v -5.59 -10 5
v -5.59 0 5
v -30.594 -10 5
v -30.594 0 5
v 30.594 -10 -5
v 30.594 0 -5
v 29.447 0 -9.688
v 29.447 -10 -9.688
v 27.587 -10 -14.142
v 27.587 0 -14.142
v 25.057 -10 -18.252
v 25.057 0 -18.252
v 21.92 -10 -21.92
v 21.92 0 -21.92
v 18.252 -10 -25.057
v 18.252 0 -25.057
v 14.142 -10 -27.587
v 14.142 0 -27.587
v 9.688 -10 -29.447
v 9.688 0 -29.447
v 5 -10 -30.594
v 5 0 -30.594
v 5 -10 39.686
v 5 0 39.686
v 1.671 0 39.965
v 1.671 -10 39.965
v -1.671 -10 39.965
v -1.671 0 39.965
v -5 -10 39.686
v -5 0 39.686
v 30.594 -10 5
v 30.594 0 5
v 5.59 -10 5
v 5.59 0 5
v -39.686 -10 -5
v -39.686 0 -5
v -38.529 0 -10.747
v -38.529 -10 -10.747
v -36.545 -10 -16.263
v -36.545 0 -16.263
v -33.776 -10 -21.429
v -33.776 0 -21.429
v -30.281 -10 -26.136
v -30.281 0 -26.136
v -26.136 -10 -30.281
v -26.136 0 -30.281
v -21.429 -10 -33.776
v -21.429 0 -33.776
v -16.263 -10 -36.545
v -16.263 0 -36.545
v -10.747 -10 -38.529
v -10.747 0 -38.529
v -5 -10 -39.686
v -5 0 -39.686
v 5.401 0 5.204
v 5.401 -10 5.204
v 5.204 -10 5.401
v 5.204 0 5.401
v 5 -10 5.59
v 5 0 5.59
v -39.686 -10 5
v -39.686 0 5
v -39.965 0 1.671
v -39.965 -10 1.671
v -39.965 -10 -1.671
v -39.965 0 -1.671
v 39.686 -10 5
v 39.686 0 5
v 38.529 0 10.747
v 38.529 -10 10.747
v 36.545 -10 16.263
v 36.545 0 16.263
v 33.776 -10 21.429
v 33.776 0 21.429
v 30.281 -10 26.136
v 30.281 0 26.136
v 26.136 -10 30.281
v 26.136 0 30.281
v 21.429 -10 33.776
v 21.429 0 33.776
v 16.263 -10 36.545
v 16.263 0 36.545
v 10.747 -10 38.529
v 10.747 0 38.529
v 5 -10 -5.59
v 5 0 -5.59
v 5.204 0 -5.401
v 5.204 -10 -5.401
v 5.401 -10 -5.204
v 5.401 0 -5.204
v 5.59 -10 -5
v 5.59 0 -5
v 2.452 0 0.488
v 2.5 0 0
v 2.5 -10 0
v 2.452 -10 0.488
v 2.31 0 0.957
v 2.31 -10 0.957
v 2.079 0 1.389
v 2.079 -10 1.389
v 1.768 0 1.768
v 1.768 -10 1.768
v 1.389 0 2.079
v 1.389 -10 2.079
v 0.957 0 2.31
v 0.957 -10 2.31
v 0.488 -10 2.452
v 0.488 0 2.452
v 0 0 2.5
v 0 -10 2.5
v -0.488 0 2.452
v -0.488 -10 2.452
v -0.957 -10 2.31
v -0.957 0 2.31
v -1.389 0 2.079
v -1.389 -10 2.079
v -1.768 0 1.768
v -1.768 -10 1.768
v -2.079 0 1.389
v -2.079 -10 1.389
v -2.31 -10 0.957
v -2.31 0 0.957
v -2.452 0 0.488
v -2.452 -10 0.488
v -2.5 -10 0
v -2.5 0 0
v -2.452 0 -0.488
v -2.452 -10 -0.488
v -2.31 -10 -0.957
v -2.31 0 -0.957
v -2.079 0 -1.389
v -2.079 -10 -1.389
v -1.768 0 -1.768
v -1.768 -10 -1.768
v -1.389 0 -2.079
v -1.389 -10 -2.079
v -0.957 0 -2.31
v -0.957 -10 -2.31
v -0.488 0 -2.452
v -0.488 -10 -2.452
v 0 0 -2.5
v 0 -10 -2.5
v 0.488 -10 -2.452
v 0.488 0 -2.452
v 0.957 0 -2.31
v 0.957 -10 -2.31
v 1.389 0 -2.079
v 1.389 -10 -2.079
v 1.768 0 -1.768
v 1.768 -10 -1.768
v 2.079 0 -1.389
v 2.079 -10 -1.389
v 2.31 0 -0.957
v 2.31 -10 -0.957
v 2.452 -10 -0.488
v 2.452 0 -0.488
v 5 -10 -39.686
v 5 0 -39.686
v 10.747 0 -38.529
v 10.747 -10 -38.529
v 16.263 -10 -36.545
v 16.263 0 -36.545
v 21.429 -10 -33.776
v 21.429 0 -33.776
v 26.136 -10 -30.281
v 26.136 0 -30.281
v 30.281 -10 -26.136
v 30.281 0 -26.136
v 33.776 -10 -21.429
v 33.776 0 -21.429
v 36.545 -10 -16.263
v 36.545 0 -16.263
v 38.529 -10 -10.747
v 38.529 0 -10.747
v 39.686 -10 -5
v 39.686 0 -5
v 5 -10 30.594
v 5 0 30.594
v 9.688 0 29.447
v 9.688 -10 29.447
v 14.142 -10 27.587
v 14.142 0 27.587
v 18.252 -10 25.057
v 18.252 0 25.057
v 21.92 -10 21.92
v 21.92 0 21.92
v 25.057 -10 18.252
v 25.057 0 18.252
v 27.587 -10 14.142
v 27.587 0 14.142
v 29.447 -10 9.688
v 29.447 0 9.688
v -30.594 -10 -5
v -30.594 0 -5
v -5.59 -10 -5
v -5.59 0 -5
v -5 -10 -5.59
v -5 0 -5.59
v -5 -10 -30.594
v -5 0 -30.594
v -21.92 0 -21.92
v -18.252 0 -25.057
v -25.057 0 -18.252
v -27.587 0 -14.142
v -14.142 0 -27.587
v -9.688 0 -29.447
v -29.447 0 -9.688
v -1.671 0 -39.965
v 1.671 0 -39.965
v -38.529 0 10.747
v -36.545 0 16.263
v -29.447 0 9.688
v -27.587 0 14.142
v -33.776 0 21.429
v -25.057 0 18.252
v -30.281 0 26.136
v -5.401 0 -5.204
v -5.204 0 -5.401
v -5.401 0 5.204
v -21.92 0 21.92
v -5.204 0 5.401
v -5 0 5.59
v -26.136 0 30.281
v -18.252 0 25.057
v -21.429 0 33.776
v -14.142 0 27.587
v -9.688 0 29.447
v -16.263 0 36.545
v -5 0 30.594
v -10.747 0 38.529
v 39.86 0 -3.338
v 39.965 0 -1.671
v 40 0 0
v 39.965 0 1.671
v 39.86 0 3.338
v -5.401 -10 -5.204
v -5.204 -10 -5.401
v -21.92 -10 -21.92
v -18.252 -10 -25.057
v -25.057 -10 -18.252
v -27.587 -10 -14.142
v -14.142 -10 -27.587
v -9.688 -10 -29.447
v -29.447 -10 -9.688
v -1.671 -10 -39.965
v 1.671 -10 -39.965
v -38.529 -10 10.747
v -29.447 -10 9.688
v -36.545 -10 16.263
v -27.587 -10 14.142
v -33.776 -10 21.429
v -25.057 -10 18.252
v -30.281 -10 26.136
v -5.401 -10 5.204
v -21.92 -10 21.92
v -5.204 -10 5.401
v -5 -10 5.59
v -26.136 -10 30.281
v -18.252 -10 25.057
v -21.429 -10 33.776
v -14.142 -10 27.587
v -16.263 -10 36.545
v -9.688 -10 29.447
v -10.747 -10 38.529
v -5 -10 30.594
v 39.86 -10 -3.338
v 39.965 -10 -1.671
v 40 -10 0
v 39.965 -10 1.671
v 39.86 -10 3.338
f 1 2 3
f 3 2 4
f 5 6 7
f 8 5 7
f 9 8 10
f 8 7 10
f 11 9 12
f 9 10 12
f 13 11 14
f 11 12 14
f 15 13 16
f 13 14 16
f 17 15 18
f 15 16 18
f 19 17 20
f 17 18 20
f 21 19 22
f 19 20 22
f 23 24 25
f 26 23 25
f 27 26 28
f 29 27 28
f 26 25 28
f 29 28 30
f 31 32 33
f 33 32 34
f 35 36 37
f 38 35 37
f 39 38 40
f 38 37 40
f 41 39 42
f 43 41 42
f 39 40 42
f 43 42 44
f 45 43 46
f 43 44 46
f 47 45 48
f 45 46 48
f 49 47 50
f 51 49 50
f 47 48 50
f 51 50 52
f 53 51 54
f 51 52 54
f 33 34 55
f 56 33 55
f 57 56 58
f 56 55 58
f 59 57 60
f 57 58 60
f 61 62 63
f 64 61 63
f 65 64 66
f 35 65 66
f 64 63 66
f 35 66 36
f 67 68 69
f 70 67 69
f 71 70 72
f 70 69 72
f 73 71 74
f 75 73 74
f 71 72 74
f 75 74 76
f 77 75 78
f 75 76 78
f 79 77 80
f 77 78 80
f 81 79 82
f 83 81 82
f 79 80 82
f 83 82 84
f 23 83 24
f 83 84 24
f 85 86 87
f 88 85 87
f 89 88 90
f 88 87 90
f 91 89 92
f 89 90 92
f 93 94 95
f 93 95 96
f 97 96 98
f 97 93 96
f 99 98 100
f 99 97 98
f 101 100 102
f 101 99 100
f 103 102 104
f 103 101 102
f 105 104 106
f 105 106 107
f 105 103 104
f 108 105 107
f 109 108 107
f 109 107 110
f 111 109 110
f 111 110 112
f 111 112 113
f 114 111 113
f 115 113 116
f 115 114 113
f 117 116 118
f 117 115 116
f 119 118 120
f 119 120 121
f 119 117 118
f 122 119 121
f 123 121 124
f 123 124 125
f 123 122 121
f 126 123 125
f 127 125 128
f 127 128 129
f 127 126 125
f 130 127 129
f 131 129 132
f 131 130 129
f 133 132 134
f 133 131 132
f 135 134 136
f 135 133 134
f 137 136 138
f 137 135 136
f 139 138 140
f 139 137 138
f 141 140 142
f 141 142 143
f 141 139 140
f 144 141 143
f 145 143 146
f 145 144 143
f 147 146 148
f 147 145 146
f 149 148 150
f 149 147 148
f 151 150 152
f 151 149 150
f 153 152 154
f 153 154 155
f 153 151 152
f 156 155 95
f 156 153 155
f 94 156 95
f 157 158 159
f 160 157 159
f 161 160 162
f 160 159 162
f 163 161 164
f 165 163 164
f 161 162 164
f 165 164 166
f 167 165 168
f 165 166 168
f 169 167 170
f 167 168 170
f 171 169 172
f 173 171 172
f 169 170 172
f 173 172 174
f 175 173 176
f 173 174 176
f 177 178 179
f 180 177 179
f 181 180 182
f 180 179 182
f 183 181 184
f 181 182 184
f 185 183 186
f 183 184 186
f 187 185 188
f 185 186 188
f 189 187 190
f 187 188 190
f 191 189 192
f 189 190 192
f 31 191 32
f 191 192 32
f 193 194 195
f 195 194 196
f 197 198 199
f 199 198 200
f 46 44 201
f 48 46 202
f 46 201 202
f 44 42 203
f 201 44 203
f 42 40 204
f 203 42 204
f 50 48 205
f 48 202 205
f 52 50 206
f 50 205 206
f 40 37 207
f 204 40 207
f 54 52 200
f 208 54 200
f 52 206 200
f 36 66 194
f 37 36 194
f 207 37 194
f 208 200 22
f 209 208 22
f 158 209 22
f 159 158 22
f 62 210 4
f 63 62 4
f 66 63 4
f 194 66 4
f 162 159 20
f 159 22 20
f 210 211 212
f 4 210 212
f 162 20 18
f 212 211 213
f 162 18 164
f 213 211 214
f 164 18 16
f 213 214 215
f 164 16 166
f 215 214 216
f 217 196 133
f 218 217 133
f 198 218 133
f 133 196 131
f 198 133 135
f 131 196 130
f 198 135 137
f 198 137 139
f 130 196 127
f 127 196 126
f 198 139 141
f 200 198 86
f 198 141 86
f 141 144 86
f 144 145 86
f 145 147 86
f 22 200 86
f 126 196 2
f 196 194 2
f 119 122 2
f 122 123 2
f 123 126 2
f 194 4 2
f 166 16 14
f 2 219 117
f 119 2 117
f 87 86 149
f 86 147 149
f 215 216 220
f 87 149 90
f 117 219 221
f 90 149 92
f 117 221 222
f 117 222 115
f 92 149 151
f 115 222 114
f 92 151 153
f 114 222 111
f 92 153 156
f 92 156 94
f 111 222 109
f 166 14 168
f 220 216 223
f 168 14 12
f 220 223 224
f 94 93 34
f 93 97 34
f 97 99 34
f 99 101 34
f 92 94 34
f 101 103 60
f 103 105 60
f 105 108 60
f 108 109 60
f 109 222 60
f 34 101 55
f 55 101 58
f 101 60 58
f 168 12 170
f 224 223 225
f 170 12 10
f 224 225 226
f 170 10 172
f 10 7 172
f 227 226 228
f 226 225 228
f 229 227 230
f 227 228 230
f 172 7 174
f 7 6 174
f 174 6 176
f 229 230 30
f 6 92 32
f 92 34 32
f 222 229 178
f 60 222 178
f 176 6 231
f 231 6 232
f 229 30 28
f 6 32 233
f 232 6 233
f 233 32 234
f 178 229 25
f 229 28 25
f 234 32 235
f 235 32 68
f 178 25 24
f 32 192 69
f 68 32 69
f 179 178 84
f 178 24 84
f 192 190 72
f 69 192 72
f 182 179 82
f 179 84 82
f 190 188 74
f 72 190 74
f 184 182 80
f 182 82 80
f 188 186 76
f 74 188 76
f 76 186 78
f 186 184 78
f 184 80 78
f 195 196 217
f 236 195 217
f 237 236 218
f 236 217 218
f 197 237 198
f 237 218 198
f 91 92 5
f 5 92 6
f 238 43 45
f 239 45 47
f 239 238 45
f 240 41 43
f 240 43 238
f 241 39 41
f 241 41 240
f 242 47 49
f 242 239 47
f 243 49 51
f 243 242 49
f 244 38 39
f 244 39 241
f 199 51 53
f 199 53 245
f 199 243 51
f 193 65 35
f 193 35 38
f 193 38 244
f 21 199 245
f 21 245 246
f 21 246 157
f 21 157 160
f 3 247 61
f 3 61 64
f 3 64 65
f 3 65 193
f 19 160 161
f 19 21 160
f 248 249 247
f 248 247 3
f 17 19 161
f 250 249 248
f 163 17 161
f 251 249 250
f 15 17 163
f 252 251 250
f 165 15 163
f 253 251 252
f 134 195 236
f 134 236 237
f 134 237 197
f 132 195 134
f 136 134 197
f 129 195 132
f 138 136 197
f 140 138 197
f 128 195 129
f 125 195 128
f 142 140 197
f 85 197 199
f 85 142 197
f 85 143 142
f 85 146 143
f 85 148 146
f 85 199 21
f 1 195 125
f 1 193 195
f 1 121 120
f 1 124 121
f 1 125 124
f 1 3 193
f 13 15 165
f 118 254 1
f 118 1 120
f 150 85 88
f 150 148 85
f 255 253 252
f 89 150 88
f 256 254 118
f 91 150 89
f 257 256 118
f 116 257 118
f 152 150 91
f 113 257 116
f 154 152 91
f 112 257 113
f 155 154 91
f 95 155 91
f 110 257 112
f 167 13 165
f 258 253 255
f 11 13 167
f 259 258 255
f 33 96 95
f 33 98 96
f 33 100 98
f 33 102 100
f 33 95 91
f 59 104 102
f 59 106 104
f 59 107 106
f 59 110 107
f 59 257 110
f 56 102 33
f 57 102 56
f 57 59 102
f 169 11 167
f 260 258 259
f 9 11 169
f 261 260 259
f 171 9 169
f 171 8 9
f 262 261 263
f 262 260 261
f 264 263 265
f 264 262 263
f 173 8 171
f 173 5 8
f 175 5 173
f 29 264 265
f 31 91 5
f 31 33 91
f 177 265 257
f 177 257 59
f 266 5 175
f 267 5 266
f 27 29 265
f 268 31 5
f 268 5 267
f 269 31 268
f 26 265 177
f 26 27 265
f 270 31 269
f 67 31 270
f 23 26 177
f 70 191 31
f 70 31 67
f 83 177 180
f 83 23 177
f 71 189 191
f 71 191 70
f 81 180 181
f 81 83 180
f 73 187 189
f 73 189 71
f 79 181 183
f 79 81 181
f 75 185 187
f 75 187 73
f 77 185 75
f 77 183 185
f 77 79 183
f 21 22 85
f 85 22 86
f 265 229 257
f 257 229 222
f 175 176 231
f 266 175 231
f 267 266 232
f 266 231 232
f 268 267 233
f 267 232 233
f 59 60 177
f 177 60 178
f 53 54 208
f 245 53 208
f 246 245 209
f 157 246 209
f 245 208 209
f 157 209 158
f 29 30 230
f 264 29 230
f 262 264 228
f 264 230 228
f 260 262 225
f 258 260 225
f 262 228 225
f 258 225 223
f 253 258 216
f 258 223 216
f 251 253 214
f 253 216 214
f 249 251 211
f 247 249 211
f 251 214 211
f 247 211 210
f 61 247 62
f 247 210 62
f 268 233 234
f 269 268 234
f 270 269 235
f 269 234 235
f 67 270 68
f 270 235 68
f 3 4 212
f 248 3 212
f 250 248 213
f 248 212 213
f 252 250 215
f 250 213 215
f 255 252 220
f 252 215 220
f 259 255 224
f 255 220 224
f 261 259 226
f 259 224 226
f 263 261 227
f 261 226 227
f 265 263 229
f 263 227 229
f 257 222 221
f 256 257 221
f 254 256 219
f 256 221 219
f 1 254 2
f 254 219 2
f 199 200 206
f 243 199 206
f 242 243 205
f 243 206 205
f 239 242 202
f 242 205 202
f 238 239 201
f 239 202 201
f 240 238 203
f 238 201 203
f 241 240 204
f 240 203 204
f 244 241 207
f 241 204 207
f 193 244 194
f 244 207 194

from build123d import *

# Parameters (mm, degrees)
F0_R     = 2.5
F1_DEPTH = 10


with BuildPart() as f1:
    # F0 (on Front) → F1 (new body)
    with BuildSketch(Plane.XZ):
        with BuildLine():
            ThreePointArc((39.68627, -5), (39.92149, -2.504917), (40, 0))
            ThreePointArc((40, 0), (39.92149, 2.504917), (39.68627, 5))
            ThreePointArc((39.68627, 5), (28.284271, 28.284271), (5, 39.68627))
            ThreePointArc((5, 39.68627), (0, 40), (-5, 39.68627))
            ThreePointArc((-5, 39.68627), (-28.284271, 28.284271), (-39.68627, 5))
            ThreePointArc((-39.68627, 5), (-40, 0), (-39.68627, -5))
            ThreePointArc((-39.68627, -5), (-28.284271, -28.284271), (-5, -39.68627))
            ThreePointArc((-5, -39.68627), (0, -40), (5, -39.68627))
            ThreePointArc((5, -39.68627), (28.284271, -28.284271), (39.68627, -5))
        make_face()
        with BuildLine():
            ThreePointArc((-5, -30.594117), (-21.92031, -21.92031), (-30.594117, -5))
            Line((-30.594117, -5), (-5.59017, -5))
            ThreePointArc((-5.59017, -5), (-5.303301, -5.303301), (-5, -5.59017))
            Line((-5, -5.59017), (-5, -30.594117))
        make_face(mode=Mode.SUBTRACT)
        with BuildLine():
            Line((5, -30.594117), (5, -5.59017))
            ThreePointArc((5, -5.59017), (5.303301, -5.303301), (5.59017, -5))
            Line((5.59017, -5), (30.594117, -5))
            ThreePointArc((30.594117, -5), (21.92031, -21.92031), (5, -30.594117))
        make_face(mode=Mode.SUBTRACT)
        with BuildLine():
            Line((-5, 30.594117), (-5, 5.59017))
            ThreePointArc((-5, 5.59017), (-5.303301, 5.303301), (-5.59017, 5))
            Line((-5.59017, 5), (-30.594117, 5))
            ThreePointArc((-30.594117, 5), (-21.92031, 21.92031), (-5, 30.594117))
        make_face(mode=Mode.SUBTRACT)
        Circle(F0_R, mode=Mode.SUBTRACT)
        with BuildLine():
            Line((30.594117, 5), (5.59017, 5))
            ThreePointArc((5.59017, 5), (5.303301, 5.303301), (5, 5.59017))
            Line((5, 5.59017), (5, 30.594117))
            ThreePointArc((5, 30.594117), (21.92031, 21.92031), (30.594117, 5))
        make_face(mode=Mode.SUBTRACT)
    extrude(amount=F1_DEPTH)


solid = f1.part
